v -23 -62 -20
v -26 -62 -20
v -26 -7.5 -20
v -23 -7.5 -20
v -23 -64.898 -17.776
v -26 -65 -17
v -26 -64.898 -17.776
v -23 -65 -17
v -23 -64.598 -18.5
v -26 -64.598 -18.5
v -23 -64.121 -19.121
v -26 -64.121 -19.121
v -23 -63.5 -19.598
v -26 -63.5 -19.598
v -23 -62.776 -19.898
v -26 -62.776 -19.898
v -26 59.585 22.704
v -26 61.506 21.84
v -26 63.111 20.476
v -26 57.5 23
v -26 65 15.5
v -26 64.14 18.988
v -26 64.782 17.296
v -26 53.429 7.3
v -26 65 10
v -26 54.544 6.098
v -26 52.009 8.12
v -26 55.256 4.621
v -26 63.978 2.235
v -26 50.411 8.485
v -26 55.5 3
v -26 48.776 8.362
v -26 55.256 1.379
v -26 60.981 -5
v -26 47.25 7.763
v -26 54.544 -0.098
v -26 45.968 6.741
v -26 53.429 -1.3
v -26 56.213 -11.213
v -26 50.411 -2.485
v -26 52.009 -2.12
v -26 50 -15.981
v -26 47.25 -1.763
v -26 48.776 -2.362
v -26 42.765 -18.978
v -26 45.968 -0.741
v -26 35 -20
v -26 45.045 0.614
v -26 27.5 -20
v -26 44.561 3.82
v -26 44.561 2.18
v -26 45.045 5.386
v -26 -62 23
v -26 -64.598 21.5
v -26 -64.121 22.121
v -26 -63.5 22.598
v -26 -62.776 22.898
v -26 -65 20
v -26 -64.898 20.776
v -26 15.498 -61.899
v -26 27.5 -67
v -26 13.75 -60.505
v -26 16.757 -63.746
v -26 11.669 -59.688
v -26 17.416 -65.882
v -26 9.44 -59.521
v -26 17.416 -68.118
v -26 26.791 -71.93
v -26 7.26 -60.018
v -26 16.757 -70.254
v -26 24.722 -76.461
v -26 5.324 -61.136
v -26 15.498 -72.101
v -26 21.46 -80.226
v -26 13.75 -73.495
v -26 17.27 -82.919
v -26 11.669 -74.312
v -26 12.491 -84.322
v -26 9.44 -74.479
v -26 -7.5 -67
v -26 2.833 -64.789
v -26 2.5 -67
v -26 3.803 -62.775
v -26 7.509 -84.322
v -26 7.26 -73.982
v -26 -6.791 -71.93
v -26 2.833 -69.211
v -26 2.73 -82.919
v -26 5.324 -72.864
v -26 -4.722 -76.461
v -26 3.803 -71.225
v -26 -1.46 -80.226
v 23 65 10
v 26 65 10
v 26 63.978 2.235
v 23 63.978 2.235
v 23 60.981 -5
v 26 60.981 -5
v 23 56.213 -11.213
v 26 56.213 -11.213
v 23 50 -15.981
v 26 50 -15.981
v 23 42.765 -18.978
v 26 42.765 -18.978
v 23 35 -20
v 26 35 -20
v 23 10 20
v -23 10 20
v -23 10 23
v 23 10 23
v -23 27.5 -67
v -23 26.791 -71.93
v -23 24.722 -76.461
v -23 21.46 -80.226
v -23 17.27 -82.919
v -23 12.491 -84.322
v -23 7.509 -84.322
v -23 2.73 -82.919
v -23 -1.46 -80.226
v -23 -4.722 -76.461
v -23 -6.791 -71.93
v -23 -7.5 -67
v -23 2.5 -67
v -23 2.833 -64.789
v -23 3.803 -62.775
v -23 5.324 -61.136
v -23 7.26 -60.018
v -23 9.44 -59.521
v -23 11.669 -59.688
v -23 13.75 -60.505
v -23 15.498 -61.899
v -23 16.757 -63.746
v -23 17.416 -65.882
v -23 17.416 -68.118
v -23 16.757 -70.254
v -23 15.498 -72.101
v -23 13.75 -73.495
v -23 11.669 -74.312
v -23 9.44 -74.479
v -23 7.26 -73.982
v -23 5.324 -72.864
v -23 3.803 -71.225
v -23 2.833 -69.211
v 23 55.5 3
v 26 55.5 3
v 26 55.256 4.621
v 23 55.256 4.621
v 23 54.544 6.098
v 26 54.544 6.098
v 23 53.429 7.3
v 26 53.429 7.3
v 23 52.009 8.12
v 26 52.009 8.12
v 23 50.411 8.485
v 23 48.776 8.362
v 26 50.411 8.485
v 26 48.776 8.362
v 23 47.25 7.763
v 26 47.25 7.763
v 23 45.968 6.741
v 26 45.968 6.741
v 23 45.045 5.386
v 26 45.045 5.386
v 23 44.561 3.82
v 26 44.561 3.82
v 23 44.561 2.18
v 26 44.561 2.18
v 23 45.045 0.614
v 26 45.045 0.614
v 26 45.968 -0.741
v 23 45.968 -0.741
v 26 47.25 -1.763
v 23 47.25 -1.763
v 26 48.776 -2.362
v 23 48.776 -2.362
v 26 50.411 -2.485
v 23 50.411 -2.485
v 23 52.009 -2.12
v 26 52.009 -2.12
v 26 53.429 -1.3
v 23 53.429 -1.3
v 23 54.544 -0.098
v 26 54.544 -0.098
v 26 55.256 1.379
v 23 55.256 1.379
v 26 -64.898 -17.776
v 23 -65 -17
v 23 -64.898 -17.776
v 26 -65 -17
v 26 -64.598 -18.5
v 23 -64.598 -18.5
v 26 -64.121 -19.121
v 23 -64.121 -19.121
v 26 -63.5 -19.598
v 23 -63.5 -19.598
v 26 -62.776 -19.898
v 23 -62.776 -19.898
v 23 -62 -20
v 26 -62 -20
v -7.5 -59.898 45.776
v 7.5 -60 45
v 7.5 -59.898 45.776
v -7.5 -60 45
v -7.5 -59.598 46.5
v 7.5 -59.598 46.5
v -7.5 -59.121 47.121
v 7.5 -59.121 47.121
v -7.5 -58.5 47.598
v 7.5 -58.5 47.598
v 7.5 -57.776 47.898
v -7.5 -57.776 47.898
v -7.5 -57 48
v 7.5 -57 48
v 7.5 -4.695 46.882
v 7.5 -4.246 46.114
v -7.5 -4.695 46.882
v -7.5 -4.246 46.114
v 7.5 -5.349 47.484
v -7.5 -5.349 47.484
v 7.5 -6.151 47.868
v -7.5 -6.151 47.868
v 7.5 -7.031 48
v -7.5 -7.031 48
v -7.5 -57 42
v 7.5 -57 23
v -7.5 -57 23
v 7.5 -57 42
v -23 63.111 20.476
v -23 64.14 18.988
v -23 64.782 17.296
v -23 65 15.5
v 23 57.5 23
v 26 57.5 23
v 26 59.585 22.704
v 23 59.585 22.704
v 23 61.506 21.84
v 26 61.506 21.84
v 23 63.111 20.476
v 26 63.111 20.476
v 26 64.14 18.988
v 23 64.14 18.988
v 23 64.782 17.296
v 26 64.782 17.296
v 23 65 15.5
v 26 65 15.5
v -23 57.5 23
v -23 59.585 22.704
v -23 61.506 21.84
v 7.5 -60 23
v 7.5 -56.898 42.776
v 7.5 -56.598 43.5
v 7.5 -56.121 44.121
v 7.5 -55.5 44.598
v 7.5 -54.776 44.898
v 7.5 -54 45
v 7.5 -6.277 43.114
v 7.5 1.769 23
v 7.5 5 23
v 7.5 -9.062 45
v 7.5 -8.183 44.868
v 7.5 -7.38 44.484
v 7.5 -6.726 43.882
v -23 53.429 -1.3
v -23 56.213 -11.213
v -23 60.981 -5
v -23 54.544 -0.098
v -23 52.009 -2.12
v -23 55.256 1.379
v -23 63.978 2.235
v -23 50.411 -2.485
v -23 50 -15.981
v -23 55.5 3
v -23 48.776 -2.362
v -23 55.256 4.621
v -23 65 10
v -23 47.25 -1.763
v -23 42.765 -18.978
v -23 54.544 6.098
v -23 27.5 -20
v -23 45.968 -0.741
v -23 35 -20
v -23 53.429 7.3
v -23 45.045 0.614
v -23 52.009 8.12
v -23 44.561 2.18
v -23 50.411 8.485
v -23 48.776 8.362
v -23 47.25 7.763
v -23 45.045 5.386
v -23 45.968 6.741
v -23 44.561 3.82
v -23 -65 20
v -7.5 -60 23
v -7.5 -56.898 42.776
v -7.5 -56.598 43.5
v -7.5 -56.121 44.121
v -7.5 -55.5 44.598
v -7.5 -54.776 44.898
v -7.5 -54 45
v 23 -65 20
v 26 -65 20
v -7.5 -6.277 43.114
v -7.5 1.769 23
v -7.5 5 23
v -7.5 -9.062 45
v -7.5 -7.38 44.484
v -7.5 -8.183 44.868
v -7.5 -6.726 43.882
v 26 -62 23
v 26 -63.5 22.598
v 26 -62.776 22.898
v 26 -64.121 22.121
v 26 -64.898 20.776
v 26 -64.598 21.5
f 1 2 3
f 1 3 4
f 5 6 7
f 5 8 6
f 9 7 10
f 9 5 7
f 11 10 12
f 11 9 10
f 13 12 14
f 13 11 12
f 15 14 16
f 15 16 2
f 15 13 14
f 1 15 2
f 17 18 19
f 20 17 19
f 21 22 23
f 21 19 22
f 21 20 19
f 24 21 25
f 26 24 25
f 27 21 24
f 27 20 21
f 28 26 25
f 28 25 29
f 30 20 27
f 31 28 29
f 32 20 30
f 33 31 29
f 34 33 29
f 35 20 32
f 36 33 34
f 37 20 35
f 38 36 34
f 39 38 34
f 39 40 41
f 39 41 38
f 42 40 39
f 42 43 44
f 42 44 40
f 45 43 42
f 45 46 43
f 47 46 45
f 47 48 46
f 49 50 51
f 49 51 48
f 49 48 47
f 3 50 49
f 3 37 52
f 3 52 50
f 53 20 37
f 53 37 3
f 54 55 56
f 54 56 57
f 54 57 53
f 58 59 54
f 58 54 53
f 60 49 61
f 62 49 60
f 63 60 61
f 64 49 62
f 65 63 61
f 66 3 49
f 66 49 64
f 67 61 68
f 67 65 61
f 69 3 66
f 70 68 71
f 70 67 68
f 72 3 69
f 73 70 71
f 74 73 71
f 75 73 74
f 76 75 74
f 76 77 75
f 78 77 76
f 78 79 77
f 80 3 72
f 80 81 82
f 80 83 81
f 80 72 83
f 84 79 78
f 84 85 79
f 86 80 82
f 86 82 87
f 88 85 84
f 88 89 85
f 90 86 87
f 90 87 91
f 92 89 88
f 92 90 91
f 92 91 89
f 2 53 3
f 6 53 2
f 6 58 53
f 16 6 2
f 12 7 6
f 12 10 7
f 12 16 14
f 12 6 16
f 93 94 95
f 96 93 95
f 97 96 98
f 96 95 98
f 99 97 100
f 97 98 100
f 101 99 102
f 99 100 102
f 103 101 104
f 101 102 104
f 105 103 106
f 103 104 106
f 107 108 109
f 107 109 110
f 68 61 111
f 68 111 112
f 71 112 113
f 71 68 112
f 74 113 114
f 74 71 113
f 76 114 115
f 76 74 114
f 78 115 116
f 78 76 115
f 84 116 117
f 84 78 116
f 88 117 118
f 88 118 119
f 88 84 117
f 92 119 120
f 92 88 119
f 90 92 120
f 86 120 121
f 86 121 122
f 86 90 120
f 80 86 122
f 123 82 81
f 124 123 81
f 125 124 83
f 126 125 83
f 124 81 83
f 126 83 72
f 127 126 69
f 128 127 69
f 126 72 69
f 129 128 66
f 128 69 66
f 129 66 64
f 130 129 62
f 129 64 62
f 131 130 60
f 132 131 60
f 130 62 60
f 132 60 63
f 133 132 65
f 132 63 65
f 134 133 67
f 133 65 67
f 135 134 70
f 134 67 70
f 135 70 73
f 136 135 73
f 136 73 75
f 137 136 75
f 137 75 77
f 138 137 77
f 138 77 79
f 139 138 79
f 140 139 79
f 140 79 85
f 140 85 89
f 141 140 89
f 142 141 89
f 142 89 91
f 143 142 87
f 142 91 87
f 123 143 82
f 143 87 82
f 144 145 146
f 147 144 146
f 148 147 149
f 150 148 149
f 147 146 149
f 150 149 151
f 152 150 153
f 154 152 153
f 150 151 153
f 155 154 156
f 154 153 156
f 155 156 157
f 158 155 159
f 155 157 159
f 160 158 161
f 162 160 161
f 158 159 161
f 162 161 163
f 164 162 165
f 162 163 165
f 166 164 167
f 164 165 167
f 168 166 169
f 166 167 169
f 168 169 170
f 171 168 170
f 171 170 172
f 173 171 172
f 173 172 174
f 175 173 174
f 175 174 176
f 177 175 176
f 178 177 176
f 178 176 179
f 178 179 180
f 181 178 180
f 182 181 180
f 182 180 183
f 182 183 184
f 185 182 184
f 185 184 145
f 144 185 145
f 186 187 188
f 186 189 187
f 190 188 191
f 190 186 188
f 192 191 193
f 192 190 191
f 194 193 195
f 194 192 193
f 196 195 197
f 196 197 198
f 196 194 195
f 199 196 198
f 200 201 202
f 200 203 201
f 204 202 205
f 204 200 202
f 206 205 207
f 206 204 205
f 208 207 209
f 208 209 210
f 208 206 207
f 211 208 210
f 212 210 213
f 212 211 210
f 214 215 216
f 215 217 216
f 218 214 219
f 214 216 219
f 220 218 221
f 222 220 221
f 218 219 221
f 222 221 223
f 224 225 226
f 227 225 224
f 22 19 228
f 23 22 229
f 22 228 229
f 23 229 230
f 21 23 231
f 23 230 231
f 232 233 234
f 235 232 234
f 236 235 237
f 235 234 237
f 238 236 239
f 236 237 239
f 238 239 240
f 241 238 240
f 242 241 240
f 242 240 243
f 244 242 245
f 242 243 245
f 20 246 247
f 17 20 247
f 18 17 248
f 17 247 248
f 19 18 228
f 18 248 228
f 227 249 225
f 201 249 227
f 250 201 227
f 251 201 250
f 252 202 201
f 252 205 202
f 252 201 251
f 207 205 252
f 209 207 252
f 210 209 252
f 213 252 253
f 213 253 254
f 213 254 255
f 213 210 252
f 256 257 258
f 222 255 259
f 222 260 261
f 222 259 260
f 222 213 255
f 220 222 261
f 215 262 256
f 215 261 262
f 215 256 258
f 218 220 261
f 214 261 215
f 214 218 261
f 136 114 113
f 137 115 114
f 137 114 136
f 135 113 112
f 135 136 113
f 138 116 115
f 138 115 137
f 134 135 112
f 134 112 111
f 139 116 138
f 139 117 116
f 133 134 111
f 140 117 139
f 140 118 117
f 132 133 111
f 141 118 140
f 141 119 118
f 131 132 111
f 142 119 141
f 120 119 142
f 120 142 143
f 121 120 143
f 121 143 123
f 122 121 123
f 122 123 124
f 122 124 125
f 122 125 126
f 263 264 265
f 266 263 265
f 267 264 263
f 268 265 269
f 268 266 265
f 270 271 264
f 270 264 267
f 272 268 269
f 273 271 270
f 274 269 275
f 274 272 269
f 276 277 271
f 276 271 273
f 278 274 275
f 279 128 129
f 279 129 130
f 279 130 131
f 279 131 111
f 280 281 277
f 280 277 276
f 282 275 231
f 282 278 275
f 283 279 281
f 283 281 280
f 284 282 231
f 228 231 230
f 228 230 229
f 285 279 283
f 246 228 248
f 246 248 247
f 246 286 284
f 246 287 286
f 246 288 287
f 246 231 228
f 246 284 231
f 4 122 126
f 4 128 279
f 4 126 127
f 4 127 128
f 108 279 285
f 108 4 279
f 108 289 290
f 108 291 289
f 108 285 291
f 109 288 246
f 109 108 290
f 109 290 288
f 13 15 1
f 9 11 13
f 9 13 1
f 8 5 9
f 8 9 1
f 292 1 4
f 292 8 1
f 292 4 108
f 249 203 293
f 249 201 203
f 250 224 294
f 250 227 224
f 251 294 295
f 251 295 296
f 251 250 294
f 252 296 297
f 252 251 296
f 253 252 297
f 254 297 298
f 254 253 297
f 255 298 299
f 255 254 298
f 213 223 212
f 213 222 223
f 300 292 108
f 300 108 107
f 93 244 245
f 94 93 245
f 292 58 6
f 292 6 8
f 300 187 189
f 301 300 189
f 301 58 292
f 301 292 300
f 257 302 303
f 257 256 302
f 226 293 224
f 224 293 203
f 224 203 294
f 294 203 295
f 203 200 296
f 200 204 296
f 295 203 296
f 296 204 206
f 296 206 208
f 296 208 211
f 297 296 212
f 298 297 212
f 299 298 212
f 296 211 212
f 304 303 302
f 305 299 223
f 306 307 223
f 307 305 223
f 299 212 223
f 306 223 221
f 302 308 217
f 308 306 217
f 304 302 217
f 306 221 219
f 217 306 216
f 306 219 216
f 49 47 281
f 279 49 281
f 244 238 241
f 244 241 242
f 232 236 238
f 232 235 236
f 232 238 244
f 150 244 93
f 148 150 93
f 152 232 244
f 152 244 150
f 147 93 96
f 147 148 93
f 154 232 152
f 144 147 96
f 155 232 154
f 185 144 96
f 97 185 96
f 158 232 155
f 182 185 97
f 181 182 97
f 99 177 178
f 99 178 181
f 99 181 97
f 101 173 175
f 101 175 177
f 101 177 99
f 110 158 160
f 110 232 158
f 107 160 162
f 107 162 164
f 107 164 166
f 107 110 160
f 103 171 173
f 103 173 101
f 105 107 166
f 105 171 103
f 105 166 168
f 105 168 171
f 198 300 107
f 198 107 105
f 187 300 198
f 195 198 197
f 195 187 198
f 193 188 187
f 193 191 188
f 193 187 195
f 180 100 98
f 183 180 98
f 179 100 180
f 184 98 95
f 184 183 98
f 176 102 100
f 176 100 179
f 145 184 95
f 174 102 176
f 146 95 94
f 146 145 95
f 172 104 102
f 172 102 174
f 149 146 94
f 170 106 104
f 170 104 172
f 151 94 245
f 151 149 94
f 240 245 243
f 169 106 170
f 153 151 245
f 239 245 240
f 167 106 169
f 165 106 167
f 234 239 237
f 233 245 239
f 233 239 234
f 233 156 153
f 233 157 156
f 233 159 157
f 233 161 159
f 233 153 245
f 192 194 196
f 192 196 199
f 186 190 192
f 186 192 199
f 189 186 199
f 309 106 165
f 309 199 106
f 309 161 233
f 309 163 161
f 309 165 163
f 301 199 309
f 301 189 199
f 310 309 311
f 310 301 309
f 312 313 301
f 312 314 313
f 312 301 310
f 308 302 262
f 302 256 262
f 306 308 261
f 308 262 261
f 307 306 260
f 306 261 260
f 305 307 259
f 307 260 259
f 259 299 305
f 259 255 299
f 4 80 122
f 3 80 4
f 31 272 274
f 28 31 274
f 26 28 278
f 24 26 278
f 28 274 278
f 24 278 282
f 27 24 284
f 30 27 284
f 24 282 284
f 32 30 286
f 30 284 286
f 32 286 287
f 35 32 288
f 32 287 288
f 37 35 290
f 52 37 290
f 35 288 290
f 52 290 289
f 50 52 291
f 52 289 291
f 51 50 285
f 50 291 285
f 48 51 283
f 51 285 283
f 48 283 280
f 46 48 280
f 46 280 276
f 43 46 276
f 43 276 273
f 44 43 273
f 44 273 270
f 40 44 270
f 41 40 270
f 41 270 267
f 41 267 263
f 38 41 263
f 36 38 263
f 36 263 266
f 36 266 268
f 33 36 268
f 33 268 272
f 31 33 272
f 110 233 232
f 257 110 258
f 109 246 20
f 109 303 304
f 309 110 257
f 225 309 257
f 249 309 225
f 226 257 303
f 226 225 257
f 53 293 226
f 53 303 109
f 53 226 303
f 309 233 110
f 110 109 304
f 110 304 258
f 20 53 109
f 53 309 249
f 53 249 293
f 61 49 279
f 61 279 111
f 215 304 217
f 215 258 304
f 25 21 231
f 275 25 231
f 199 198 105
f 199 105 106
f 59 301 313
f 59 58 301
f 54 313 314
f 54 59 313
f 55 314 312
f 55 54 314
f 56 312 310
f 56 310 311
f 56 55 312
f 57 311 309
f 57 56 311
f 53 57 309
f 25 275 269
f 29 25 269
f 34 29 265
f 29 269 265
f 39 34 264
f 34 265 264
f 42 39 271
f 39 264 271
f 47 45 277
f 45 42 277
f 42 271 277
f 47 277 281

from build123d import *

# Parameters (mm, degrees)
F1_DEPTH = 65
F2_R     = 5.5
F3_DEPTH = 52.001
F4_W     = 46
F4_H     = 55
F5_DEPTH = 25
F7_DEPTH = 7.5
F8_R     = 7.5
F9_DEPTH = 3
F10_R    = 2.99999


# Not quite as in the source:
# - a fillet or chamfer is up to 0.001 mm smaller than in the source, because OpenCascade refuses the exact size
# - a feature names something its author has since deleted; it is built from what else it names


with BuildPart() as f1:
    # F0 (on Front) → F1 (new body, symmetric)
    with BuildSketch(Plane.XZ):
        Polygon((-23, 20), (23, 20), (23, -20), (26, -20), (26, 23), (-26, 23), (-26, -20), (-23, -20), align=None)
    extrude(amount=F1_DEPTH, both=True)

    # F2 (on face) → F3 (cut, through all)
    with BuildSketch(Plane.YZ.offset(26)):
        with Locations((50, 3)):
            Circle(F2_R)
        with BuildLine():
            Line((65, -20), (65, 10))
            ThreePointArc((65, 10), (56.2132034356, -11.2132034356), (35, -20))
            Line((35, -20), (65, -20))
        make_face()
        with BuildLine():
            ThreePointArc((63.1113759485, 20.4761893015), (64.5119654739, 18.161266652), (65, 15.5))
            Line((65, 15.5), (65, 23))
            Line((65, 23), (62.0370116692, 23))
            ThreePointArc((62.0370116692, 23), (62.6030536231, 21.7503800228), (63.1113759485, 20.4761893015))
        make_face()
        with BuildLine():
            ThreePointArc((57.5, 23), (60.5764086399, 22.3400080322), (63.1113759485, 20.4761893015))
            ThreePointArc((63.1113759485, 20.4761893015), (62.6030536231, 21.7503800228), (62.0370116692, 23))
            Line((62.0370116692, 23), (57.5, 23))
        make_face()
    extrude(amount=-F3_DEPTH, mode=Mode.SUBTRACT)

    # F4 (on face) → F5 (cut)
    with BuildSketch(Plane(origin=(0, 0, 20), x_dir=(1, 0, 0), z_dir=(0, 0, -1))):
        with Locations((0, -37.5)):
            Rectangle(F4_W, F4_H)
    extrude(amount=-F5_DEPTH, mode=Mode.SUBTRACT)

    # F6 (on Right) → F7 (join, symmetric)
    with BuildSketch(Plane.YZ):
        Polygon((-60, 48), (-60, 23), (-57, 23), (-57, 45), (-7.0310988843, 45), (1.7689011157, 23), (5, 23), (-5, 48), align=None)
    extrude(amount=F7_DEPTH, both=True)

    # F8 (on face) → F9 (join)
    with BuildSketch(Plane(origin=(-26, 0, 0), x_dir=(0, -1, 0), z_dir=(-1, 0, 0))):
        with BuildLine():
            Line((7.5, -20), (-27.5, -20))
            Line((-27.5, -20), (-27.5, -67))
            ThreePointArc((-27.5, -67), (-10, -49.5), (7.5, -67))
            Line((7.5, -67), (7.5, -20))
        make_face()
        with BuildLine():
            ThreePointArc((7.5, -67), (-10, -49.5), (-27.5, -67))
            ThreePointArc((-27.5, -67), (-10, -84.5), (7.5, -67))
        make_face()
        with Locations((-10, -67)):
            Circle(F8_R, mode=Mode.SUBTRACT)
    extrude(amount=-F9_DEPTH)

    # F10 (radius 3 in the source; OpenCascade refuses exactly that, so slightly less here)
    f10_edges = [f1.edges().sort_by_distance(p)[0] for p in [
        (24.5, -65, -20),
        (-24.5, -65, -20),
        (0, -60, 48),
        (0, -57, 45),
        (0, -7.031099, 45),
        (0, -5, 48),
        (0, -65, 23),
    ]]
    fillet(f10_edges, radius=F10_R)


solid = f1.part
